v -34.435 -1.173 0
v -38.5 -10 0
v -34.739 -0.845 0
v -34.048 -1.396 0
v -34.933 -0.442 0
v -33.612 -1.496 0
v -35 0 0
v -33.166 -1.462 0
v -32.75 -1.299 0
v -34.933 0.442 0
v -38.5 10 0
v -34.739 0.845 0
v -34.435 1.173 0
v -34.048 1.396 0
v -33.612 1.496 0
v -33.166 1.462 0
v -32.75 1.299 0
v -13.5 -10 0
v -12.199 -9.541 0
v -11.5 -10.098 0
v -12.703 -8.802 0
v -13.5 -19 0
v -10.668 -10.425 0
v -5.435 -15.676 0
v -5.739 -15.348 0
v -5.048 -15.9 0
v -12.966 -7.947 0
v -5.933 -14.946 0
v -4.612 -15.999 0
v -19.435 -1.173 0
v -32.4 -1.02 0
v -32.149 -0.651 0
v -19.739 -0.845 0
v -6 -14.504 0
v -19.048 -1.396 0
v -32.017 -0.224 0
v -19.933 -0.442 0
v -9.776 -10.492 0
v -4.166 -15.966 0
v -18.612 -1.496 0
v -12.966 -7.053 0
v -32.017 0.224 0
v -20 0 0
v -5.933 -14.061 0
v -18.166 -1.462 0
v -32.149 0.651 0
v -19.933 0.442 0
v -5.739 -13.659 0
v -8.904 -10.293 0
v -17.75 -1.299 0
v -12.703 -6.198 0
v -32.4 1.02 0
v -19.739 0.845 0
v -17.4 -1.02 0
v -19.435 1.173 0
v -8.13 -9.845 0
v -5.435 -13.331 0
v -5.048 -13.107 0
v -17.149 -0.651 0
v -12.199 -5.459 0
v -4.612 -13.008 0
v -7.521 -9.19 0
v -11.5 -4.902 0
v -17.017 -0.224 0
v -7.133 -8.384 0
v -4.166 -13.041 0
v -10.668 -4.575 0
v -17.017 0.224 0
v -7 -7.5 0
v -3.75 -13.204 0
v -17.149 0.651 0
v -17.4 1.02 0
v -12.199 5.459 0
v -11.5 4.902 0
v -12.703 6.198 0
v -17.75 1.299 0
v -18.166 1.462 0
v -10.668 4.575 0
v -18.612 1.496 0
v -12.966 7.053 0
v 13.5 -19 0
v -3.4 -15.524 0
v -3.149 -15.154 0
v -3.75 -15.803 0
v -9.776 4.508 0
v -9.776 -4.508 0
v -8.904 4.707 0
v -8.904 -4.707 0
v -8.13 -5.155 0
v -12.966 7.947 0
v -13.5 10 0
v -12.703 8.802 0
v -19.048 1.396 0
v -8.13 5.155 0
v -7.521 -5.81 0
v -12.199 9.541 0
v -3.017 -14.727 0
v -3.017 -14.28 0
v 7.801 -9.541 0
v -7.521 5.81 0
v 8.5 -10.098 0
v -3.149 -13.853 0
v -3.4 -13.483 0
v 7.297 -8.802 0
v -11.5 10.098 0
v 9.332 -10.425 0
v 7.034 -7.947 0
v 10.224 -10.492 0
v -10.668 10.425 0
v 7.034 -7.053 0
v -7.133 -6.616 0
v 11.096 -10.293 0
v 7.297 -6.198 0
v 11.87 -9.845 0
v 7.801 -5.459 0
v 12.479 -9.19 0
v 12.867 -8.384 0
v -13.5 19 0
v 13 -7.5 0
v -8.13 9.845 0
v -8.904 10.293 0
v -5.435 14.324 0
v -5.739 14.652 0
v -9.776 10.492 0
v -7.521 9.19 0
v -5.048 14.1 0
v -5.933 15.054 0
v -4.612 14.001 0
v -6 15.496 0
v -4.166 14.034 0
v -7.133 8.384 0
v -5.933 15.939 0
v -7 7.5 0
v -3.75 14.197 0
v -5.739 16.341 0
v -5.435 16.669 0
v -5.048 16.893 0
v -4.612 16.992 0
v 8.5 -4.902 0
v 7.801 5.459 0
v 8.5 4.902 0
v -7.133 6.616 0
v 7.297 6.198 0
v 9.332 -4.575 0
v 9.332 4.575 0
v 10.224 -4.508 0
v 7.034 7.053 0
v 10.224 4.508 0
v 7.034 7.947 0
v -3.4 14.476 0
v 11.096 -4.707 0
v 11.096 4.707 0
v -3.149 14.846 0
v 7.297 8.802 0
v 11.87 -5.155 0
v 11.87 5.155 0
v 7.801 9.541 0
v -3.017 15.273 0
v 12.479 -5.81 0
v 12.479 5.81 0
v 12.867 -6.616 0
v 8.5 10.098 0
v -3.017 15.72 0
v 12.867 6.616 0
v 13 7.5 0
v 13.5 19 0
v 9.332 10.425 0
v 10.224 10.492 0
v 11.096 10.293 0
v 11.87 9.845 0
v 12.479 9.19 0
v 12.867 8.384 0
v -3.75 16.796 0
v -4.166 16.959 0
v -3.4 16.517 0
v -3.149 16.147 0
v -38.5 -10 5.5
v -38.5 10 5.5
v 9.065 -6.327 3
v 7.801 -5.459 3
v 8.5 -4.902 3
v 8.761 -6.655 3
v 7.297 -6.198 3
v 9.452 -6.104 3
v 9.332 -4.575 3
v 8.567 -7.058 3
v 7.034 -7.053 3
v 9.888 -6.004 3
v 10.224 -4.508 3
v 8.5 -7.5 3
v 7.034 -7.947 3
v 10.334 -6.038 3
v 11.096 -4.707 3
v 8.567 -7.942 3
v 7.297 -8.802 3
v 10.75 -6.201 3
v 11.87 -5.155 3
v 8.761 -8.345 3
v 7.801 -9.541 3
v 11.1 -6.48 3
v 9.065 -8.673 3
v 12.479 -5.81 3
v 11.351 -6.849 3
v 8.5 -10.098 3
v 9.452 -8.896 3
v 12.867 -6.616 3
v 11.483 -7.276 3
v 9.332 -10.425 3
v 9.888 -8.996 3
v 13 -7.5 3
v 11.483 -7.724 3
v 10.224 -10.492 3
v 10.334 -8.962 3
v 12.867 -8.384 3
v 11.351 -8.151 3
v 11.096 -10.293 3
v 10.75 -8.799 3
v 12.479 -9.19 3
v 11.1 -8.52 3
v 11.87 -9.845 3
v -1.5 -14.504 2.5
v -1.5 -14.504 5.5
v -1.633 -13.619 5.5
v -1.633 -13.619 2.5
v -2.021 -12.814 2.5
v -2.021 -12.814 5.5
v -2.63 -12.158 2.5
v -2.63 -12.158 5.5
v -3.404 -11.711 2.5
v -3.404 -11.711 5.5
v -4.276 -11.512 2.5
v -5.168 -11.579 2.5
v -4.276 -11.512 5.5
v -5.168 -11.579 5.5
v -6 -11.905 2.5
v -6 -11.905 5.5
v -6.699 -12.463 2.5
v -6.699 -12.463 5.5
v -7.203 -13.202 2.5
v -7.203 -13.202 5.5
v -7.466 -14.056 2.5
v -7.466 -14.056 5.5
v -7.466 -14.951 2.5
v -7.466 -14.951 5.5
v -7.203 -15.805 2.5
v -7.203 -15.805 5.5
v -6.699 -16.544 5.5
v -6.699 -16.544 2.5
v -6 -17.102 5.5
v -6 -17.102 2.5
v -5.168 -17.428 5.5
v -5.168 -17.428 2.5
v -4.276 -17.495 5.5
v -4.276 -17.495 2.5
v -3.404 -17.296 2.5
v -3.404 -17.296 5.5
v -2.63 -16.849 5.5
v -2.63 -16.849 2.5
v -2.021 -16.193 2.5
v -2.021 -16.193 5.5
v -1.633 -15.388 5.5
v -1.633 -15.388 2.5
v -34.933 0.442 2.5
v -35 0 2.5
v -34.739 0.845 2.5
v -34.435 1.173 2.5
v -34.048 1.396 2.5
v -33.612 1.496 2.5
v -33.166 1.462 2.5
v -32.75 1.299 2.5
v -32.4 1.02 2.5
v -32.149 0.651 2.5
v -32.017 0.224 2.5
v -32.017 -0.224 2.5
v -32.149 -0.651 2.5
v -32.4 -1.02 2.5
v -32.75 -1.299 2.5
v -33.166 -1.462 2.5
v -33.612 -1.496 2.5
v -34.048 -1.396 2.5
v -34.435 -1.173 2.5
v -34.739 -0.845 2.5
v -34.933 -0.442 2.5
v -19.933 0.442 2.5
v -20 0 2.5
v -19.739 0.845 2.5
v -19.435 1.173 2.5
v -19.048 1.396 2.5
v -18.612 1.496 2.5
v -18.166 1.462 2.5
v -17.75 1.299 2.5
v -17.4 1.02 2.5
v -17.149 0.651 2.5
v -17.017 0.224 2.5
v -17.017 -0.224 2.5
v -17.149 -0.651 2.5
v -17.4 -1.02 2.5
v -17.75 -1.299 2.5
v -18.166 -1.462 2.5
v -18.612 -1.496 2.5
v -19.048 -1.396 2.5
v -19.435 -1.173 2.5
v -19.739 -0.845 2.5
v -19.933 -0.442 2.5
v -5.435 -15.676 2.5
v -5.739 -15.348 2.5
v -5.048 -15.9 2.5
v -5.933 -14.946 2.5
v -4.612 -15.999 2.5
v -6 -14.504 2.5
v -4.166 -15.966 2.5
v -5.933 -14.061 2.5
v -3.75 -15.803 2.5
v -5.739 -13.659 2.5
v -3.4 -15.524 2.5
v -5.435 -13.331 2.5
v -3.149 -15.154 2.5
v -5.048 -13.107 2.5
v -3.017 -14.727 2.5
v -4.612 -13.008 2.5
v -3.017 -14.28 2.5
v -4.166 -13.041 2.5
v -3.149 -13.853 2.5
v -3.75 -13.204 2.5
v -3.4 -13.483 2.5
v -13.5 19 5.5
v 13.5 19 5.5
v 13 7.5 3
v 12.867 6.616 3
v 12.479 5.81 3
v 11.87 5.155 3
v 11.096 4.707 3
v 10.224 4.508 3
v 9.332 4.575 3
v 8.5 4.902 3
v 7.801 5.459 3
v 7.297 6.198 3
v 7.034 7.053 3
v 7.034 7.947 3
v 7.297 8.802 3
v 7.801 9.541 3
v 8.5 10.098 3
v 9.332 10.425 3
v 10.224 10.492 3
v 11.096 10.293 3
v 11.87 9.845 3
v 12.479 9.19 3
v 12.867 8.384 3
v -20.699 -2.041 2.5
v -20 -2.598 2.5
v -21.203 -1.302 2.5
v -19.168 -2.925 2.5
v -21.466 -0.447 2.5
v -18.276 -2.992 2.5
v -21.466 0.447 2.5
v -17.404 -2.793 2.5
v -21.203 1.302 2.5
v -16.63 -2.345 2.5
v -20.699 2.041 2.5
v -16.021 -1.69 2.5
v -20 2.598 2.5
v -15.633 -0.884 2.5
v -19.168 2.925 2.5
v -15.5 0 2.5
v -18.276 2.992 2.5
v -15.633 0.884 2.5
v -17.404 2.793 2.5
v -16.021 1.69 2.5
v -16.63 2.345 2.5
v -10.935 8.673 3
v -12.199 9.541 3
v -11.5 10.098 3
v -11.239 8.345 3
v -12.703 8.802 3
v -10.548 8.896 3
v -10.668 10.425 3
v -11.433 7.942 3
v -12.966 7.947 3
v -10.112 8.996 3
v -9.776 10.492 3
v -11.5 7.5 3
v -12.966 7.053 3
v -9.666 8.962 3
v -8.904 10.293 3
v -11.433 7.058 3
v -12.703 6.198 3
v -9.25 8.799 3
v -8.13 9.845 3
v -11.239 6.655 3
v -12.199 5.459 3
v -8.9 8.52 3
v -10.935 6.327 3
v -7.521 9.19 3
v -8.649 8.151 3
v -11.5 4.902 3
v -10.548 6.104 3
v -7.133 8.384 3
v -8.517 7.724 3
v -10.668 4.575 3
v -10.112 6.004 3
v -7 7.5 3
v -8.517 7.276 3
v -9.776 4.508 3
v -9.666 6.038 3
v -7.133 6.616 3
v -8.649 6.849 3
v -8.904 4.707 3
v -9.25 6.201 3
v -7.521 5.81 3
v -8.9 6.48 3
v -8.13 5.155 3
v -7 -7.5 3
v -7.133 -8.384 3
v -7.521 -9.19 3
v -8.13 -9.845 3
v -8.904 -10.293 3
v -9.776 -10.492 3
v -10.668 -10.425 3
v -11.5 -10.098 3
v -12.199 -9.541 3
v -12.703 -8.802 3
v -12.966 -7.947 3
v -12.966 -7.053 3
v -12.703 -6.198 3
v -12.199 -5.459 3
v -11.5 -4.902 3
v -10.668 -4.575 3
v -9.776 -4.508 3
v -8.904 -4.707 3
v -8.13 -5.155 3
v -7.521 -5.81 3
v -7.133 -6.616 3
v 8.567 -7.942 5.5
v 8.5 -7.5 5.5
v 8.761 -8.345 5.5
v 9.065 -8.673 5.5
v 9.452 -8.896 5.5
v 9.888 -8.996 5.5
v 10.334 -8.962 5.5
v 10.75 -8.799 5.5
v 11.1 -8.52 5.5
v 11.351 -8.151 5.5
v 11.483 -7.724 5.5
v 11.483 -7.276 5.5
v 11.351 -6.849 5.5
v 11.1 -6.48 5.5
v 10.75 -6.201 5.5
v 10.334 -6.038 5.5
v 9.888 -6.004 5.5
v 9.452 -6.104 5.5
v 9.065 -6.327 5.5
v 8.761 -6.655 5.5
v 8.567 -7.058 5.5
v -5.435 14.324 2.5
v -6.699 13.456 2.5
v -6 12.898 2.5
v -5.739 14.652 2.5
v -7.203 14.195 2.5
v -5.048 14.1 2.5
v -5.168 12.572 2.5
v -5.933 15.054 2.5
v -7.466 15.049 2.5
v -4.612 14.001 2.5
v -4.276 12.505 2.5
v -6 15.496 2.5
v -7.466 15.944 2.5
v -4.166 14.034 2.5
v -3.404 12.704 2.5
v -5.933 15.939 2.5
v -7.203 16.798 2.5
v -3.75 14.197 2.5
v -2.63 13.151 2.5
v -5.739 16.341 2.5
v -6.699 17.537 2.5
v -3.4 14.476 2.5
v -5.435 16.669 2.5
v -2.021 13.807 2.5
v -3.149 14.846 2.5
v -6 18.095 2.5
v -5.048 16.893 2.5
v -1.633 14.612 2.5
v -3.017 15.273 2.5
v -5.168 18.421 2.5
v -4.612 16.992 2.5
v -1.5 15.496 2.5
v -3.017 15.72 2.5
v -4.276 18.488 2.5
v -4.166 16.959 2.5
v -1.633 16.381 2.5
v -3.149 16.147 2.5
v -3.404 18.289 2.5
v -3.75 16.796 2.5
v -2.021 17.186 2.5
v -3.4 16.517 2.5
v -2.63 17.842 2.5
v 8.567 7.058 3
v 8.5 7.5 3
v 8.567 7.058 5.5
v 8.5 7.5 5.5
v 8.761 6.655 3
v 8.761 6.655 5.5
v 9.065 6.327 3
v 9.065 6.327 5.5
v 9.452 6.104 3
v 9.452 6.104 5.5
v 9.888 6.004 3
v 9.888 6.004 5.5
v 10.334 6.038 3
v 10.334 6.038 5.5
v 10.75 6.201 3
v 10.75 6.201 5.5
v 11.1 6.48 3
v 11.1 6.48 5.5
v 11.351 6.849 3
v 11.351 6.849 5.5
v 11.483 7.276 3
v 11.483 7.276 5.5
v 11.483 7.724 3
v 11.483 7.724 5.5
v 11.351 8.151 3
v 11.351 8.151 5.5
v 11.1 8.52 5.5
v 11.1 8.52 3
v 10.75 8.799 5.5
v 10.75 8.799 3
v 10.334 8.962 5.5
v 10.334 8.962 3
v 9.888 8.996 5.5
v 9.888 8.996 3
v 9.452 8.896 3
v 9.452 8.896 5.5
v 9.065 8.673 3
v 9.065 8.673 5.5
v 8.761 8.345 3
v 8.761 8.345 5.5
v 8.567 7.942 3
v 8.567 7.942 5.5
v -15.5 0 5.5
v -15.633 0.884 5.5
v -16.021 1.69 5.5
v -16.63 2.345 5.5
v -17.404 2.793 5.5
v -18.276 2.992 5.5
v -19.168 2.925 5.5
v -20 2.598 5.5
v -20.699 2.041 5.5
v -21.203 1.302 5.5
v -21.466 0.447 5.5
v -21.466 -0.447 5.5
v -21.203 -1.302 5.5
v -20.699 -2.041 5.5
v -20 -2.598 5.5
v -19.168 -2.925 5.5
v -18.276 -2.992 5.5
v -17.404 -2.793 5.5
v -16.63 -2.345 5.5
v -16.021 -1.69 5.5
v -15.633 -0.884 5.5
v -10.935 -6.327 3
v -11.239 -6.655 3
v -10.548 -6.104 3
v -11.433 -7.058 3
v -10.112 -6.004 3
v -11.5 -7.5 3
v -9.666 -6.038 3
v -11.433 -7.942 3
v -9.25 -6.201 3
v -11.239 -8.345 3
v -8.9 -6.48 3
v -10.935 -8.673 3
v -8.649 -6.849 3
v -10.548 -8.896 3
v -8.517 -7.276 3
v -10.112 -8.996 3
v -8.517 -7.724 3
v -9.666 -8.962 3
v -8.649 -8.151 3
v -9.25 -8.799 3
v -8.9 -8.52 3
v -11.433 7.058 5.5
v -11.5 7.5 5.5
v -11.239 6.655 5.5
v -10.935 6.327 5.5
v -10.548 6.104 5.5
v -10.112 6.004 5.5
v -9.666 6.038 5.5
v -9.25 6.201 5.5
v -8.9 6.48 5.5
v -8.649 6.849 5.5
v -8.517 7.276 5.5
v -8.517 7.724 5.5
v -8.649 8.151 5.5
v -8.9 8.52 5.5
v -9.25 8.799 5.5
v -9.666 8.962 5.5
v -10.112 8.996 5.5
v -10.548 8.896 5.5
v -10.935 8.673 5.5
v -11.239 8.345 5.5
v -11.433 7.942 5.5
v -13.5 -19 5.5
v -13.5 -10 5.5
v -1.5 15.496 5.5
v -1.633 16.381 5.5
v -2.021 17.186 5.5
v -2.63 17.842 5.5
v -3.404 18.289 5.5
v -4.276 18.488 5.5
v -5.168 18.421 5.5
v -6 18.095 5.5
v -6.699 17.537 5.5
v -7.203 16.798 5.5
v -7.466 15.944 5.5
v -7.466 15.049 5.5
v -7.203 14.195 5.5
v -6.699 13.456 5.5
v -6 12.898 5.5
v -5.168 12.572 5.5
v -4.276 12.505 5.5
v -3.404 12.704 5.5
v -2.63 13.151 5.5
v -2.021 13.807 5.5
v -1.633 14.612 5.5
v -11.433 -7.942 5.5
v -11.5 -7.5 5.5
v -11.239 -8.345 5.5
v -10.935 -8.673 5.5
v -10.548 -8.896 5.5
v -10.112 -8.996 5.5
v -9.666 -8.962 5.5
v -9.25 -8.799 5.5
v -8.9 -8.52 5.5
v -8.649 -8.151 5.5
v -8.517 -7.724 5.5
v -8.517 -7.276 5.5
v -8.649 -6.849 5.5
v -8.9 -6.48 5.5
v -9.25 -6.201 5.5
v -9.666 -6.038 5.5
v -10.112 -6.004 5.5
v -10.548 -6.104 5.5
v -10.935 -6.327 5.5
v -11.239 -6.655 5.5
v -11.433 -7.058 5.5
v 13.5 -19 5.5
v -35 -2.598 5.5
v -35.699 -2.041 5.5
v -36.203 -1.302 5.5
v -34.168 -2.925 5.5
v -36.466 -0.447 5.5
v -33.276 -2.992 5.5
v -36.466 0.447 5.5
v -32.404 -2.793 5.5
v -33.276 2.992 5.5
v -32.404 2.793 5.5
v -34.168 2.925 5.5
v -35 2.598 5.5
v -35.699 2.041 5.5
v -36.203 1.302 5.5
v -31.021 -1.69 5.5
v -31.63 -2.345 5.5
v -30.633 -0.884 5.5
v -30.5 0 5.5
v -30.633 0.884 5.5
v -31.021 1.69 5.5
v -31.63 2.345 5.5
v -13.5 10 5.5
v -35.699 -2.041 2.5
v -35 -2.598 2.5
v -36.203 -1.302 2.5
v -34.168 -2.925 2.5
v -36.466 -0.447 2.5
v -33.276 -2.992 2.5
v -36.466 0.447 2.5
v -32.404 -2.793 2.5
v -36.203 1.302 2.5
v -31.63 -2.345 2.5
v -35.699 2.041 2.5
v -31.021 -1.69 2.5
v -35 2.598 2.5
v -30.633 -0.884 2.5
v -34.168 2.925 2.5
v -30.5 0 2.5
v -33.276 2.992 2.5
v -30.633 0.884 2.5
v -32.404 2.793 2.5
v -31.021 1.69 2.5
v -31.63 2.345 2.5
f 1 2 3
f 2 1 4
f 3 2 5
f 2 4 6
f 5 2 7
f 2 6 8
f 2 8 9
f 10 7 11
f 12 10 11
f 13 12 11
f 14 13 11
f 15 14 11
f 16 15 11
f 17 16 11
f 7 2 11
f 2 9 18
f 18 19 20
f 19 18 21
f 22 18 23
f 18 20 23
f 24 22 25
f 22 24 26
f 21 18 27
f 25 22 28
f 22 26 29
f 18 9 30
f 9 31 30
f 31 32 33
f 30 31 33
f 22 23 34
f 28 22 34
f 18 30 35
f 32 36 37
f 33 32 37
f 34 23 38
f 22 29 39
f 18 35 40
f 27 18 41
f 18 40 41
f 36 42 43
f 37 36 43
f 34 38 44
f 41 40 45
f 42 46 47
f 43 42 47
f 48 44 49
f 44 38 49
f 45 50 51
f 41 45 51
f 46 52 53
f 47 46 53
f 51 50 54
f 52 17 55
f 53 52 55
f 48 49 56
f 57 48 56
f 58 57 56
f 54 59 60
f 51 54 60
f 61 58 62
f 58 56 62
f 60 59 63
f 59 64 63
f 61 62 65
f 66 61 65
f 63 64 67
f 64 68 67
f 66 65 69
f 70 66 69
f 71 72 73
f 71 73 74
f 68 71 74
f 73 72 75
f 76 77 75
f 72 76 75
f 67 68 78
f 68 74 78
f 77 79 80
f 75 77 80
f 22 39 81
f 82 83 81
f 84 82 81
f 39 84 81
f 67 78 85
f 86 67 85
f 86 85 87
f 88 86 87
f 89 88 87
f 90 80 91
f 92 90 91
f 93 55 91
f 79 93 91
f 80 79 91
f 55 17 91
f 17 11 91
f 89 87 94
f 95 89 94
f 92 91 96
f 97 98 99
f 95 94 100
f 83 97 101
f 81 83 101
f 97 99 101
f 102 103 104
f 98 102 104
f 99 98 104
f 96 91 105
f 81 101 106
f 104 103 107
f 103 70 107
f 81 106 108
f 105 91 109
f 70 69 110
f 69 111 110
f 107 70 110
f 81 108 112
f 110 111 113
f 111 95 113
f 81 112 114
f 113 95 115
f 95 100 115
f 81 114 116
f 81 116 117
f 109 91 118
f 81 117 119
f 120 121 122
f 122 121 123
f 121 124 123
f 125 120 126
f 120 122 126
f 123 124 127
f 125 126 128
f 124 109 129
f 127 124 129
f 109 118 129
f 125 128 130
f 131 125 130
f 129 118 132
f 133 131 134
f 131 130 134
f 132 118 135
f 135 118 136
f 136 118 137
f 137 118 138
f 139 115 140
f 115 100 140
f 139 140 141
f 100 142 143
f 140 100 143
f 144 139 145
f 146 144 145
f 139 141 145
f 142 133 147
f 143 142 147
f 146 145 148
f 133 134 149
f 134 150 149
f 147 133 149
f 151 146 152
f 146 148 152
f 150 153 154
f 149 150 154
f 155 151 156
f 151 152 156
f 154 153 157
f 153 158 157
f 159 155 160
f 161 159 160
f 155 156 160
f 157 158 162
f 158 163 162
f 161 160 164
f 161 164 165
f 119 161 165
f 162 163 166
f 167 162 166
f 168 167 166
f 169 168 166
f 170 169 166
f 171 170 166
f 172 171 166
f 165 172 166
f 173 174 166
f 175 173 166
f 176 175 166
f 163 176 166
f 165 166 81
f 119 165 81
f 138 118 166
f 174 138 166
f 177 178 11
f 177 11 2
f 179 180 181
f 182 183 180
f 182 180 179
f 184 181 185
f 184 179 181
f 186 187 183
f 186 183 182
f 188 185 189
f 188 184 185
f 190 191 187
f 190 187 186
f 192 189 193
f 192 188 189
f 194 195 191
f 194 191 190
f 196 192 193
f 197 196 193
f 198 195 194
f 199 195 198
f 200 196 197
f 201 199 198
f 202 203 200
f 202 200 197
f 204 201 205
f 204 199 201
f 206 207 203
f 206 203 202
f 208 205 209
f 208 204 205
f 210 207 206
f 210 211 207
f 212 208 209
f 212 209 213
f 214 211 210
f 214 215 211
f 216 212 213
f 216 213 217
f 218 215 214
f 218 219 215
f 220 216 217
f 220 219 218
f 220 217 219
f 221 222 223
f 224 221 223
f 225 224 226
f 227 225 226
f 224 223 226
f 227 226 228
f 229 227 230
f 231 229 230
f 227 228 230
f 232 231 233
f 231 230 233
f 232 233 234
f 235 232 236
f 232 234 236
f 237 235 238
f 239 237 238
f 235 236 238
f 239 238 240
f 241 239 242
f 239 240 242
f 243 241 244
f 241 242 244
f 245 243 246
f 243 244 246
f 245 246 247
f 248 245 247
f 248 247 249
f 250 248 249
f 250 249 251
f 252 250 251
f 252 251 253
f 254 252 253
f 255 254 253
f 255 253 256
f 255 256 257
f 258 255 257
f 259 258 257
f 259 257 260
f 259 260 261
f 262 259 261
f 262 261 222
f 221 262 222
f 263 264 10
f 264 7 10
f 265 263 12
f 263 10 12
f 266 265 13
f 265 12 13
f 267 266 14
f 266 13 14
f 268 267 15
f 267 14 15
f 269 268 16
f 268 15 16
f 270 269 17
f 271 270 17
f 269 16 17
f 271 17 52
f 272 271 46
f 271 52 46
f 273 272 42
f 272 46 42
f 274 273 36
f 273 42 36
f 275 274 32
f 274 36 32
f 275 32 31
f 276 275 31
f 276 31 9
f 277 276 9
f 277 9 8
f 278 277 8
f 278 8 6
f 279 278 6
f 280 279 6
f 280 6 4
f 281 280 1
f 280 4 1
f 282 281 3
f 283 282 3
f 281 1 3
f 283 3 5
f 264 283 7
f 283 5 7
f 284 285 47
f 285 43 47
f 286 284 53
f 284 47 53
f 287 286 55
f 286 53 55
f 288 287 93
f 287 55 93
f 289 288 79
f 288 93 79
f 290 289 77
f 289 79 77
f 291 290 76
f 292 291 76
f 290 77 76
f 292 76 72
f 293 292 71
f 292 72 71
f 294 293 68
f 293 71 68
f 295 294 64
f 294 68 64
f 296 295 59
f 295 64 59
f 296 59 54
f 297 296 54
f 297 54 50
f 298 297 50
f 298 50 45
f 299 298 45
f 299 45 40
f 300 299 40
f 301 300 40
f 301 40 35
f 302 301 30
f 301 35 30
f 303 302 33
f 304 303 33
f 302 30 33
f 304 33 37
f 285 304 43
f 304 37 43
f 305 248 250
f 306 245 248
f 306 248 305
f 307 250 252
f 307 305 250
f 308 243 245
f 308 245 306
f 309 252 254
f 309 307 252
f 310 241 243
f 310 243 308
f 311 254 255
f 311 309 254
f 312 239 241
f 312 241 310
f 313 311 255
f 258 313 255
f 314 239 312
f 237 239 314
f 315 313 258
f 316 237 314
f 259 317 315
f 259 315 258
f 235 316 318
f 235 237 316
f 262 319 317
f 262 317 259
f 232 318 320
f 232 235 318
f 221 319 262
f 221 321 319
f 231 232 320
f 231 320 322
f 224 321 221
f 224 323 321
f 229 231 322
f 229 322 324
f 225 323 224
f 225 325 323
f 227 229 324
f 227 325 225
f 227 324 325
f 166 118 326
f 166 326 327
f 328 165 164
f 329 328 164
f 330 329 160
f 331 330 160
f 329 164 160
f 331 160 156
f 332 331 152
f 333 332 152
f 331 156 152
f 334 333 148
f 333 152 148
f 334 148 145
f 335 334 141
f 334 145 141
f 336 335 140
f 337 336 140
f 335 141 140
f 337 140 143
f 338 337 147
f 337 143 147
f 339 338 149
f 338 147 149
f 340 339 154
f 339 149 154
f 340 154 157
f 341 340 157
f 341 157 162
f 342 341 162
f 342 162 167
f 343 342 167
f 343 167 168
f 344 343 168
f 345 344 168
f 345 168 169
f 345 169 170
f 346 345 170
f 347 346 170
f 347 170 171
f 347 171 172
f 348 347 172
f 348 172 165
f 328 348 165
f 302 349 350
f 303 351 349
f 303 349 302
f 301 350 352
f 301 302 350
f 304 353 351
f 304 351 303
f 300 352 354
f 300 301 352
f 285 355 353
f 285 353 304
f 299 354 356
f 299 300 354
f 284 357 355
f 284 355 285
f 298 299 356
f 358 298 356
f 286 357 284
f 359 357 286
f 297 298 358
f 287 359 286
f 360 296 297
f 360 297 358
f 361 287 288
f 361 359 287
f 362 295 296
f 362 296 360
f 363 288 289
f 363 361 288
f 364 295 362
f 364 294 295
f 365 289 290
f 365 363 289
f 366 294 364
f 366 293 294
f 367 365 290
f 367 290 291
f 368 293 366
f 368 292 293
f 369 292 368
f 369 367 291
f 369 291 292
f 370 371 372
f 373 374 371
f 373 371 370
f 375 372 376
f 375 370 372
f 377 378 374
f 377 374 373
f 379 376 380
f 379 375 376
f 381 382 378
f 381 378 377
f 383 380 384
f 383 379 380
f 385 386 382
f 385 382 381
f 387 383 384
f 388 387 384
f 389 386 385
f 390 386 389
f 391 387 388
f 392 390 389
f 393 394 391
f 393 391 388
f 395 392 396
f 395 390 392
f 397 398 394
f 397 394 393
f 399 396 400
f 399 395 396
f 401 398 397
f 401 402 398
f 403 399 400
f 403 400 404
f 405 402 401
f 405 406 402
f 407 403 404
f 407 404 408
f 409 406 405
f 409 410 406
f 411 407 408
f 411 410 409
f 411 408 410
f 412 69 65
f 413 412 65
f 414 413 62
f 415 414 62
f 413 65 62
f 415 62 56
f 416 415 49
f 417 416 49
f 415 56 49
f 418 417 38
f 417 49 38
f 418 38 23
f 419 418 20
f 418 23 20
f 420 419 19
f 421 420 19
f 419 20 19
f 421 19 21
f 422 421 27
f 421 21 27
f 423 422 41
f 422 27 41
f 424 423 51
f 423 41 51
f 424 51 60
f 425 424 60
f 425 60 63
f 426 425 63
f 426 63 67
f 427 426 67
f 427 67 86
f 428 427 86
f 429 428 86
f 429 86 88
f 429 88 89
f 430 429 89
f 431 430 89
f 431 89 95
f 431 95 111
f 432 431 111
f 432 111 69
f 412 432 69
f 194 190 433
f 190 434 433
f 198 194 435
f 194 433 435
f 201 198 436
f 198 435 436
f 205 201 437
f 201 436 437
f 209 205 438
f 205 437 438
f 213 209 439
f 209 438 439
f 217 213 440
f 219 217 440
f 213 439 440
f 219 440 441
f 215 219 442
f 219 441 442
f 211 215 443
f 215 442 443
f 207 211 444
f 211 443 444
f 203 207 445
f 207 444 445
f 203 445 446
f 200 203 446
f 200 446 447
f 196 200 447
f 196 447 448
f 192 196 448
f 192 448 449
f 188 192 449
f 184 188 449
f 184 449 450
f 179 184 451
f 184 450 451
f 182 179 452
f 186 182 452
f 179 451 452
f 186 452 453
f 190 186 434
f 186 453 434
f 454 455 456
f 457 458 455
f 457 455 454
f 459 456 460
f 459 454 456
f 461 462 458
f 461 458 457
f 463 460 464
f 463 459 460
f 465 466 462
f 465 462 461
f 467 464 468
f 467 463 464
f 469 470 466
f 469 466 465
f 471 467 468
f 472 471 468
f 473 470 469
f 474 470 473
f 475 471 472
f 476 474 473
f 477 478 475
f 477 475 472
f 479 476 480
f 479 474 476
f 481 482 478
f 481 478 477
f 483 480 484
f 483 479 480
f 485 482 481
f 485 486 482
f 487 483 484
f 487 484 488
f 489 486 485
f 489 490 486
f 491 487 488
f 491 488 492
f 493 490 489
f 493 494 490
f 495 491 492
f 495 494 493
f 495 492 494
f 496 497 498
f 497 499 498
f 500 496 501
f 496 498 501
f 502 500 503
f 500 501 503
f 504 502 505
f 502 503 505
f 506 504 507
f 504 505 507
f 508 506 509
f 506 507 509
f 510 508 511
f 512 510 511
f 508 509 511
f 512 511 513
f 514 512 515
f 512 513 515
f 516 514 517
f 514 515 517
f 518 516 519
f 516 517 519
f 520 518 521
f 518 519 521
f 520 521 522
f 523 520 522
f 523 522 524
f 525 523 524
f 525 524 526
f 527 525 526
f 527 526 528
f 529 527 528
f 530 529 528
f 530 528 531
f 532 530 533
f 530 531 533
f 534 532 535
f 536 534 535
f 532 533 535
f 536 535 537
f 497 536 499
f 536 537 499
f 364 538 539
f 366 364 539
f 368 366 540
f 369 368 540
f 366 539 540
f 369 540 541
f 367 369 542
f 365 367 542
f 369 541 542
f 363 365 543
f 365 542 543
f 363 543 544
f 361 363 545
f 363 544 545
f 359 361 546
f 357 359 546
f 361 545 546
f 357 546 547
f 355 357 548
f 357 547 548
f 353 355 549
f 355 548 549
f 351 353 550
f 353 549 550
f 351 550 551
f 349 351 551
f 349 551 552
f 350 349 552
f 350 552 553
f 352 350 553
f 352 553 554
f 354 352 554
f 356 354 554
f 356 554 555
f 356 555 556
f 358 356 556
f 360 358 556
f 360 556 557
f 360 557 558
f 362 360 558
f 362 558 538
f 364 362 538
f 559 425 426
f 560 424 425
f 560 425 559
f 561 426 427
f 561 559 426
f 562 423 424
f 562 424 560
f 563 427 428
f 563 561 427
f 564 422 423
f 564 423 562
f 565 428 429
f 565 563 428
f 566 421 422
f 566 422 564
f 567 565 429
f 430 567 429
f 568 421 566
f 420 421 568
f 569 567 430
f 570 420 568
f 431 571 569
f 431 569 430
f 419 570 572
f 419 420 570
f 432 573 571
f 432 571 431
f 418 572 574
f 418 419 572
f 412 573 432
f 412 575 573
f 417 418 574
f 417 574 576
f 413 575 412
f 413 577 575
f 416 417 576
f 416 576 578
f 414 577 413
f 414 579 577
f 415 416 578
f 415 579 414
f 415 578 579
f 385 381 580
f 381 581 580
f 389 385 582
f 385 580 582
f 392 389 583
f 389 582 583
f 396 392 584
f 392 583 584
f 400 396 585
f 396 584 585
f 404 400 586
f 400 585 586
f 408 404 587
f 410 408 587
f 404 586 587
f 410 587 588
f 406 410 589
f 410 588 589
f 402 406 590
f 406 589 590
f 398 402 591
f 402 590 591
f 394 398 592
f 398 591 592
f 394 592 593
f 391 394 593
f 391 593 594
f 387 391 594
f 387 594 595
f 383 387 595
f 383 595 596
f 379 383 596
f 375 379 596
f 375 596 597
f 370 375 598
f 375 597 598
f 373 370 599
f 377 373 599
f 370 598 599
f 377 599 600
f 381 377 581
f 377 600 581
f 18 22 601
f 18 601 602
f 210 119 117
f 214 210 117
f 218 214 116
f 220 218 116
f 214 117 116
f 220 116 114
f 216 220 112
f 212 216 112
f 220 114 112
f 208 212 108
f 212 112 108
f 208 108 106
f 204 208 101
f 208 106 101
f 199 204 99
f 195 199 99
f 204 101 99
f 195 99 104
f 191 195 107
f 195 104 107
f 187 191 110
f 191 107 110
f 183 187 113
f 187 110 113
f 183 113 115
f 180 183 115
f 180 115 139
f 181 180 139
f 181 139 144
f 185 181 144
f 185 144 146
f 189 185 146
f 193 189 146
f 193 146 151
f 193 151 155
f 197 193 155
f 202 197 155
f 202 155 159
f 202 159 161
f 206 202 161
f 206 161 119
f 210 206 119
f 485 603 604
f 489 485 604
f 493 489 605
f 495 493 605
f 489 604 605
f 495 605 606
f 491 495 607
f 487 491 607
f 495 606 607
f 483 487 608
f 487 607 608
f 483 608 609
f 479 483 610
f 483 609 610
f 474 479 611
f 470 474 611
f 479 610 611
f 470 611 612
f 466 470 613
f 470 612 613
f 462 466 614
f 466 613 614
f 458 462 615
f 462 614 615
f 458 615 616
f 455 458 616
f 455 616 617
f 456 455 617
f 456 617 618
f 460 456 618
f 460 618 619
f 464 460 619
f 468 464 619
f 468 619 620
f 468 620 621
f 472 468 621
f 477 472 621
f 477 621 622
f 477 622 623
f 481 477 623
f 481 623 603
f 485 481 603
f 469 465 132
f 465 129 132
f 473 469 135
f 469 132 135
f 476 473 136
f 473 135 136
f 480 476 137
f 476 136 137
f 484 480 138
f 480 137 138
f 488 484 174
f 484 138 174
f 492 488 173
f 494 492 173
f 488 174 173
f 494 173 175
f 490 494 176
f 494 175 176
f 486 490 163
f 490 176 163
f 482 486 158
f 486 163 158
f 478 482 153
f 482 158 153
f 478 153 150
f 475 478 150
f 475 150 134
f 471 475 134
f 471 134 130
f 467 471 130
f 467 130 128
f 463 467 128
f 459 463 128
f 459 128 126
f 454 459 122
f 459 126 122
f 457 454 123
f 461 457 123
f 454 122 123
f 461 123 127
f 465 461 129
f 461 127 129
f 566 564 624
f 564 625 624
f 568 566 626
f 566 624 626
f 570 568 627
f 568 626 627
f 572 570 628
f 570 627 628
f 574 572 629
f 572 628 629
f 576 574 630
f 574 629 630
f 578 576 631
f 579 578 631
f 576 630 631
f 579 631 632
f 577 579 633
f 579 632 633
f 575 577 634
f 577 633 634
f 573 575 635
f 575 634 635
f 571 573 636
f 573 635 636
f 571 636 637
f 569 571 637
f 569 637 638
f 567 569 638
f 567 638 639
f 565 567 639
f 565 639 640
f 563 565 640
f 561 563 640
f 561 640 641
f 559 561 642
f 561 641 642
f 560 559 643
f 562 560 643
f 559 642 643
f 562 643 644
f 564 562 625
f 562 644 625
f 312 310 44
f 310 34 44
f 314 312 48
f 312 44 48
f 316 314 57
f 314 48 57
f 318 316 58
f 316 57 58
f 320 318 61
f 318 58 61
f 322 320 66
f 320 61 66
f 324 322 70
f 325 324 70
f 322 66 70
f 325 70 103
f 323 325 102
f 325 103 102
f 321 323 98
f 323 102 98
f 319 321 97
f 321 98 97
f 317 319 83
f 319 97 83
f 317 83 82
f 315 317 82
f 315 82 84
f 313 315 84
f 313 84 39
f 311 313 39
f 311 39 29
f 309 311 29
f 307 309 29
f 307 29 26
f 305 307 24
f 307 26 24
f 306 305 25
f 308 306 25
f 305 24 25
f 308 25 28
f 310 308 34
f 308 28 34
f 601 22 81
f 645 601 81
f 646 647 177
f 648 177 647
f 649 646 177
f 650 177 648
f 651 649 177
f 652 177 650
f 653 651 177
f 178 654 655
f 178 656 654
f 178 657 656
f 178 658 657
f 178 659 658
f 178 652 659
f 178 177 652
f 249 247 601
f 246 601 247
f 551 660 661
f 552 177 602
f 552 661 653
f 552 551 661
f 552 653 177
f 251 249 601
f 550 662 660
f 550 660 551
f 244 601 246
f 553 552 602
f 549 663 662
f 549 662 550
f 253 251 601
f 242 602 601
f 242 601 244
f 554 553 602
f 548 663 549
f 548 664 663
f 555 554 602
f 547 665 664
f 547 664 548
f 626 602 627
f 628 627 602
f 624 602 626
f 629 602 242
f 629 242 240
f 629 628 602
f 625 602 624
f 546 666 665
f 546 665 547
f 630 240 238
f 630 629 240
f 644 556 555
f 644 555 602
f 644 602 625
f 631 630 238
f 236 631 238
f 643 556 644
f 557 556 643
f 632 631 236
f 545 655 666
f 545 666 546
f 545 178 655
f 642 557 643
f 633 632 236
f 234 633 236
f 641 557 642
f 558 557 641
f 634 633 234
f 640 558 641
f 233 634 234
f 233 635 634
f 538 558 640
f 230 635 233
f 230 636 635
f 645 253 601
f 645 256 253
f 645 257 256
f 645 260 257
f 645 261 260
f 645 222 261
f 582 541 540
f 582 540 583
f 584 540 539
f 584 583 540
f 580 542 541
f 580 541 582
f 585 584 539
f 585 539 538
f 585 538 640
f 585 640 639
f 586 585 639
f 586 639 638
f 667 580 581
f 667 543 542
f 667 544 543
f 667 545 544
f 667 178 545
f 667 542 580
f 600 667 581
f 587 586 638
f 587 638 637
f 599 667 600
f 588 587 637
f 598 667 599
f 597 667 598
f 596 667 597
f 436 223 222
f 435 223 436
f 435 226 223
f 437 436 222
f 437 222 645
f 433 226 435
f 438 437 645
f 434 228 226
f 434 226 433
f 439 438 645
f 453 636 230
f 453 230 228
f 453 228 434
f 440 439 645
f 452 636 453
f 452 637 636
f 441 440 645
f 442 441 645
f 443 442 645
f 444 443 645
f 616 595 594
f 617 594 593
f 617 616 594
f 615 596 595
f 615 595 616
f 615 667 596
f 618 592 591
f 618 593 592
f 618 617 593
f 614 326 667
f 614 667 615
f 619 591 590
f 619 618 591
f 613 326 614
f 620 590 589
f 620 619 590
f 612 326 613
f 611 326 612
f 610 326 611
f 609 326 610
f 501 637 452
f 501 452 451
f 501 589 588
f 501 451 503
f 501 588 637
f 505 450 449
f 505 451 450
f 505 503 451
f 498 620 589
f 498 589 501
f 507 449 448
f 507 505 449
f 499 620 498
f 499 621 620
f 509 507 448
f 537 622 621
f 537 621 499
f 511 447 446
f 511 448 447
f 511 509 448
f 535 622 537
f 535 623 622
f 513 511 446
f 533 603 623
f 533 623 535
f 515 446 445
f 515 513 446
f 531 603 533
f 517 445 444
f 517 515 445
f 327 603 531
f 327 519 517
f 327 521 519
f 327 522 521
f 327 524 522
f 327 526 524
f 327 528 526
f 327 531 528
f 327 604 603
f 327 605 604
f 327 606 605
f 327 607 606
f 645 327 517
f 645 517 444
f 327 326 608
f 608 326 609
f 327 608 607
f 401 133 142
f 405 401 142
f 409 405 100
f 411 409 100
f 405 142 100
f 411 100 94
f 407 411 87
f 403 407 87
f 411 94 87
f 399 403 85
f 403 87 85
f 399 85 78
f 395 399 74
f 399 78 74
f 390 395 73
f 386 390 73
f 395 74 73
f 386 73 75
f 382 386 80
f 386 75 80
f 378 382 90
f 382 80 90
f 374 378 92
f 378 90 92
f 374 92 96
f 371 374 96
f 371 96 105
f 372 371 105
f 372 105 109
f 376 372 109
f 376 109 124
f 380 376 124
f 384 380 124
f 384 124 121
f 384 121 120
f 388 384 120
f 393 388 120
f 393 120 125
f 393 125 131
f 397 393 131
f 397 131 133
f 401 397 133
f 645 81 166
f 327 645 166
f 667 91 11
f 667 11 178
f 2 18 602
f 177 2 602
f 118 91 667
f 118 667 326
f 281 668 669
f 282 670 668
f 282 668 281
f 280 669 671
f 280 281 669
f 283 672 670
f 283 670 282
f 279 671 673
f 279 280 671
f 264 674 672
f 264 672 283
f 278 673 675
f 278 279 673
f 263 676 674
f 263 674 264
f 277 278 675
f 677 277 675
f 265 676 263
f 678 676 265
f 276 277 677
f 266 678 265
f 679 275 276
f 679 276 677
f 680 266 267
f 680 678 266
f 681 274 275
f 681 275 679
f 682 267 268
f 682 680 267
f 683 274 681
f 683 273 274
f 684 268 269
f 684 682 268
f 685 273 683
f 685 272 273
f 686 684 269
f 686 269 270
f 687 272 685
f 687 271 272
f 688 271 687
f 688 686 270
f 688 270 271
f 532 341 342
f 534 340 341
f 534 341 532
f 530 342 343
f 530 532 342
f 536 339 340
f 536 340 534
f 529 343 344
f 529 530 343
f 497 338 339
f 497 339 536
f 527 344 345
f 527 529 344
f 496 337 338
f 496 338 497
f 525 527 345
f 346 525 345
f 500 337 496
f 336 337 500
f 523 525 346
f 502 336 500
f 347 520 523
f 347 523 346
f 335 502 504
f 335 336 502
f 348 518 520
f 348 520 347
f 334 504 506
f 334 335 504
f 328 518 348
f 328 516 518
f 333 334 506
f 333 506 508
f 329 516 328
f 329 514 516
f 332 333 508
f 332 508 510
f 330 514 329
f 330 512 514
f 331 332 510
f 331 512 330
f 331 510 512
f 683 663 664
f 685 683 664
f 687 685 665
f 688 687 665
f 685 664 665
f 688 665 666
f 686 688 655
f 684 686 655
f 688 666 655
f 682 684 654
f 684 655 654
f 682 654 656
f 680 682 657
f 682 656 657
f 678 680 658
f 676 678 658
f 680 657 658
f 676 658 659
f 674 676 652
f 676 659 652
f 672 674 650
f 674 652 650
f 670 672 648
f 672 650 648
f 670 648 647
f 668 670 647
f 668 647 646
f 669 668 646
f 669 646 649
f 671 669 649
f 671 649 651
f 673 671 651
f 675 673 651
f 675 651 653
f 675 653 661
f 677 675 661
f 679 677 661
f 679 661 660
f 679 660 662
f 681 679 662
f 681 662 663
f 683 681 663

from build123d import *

# Parameters (mm, degrees)
F0_W           = 27
F0_H           = 38
F0_W_2         = 20
F0_H_2         = 15
F1_DEPTH       = 5.5
F2_D           = 3
F2_DEPTH       = 50
F2_CBORE_D     = 6
F2_CBORE_DEPTH = 3
F4_D           = 3
F4_DEPTH       = 50
F4_CBORE_D     = 6
F4_CBORE_DEPTH = 3
F5_W           = 20
F5_H           = 5.5
F6_DEPTH       = 25
F8_D           = 3
F8_DEPTH       = 50
F8_CBORE_D     = 6
F8_CBORE_DEPTH = 3


with BuildPart() as f1:
    # F0 (on Top) → F1 (new body)
    with BuildSketch(Plane.XY):
        Rectangle(F0_W, F0_H)
        Rectangle(F0_W_2, F0_H_2, mode=Mode.SUBTRACT)
        Rectangle(F0_W_2, F0_H_2)
    extrude(amount=F1_DEPTH)

    # F2
    with Locations(Plane(origin=(0, 0, 0), x_dir=(1, 0, 0), z_dir=(0, 0, -1))):
        with Locations((-10, -7.5), (-10, 7.5), (10, -7.5), (10, 7.5)):
            CounterBoreHole(F2_D / 2, F2_CBORE_D / 2, F2_CBORE_DEPTH, depth=F2_DEPTH)

    # F4
    with Locations(Plane.XY.offset(5.5)):
        with Locations((-4.5, -14.503504), (-4.5, 15.496496)):
            CounterBoreHole(F4_D / 2, F4_CBORE_D / 2, F4_CBORE_DEPTH, depth=F4_DEPTH)

    # F5 (on face) → F6 (join)
    with BuildSketch(Plane(origin=(-13.5, 0, 0), x_dir=(0, -1, 0), z_dir=(-1, 0, 0))):
        with Locations((0, 2.75)):
            Rectangle(F5_W, F5_H)
    extrude(amount=F6_DEPTH)

    # F8
    with Locations(Plane.XY.offset(5.5)):
        with Locations((-33.5, 0), (-18.5, 0)):
            CounterBoreHole(F8_D / 2, F8_CBORE_D / 2, F8_CBORE_DEPTH, depth=F8_DEPTH)


solid = f1.part
